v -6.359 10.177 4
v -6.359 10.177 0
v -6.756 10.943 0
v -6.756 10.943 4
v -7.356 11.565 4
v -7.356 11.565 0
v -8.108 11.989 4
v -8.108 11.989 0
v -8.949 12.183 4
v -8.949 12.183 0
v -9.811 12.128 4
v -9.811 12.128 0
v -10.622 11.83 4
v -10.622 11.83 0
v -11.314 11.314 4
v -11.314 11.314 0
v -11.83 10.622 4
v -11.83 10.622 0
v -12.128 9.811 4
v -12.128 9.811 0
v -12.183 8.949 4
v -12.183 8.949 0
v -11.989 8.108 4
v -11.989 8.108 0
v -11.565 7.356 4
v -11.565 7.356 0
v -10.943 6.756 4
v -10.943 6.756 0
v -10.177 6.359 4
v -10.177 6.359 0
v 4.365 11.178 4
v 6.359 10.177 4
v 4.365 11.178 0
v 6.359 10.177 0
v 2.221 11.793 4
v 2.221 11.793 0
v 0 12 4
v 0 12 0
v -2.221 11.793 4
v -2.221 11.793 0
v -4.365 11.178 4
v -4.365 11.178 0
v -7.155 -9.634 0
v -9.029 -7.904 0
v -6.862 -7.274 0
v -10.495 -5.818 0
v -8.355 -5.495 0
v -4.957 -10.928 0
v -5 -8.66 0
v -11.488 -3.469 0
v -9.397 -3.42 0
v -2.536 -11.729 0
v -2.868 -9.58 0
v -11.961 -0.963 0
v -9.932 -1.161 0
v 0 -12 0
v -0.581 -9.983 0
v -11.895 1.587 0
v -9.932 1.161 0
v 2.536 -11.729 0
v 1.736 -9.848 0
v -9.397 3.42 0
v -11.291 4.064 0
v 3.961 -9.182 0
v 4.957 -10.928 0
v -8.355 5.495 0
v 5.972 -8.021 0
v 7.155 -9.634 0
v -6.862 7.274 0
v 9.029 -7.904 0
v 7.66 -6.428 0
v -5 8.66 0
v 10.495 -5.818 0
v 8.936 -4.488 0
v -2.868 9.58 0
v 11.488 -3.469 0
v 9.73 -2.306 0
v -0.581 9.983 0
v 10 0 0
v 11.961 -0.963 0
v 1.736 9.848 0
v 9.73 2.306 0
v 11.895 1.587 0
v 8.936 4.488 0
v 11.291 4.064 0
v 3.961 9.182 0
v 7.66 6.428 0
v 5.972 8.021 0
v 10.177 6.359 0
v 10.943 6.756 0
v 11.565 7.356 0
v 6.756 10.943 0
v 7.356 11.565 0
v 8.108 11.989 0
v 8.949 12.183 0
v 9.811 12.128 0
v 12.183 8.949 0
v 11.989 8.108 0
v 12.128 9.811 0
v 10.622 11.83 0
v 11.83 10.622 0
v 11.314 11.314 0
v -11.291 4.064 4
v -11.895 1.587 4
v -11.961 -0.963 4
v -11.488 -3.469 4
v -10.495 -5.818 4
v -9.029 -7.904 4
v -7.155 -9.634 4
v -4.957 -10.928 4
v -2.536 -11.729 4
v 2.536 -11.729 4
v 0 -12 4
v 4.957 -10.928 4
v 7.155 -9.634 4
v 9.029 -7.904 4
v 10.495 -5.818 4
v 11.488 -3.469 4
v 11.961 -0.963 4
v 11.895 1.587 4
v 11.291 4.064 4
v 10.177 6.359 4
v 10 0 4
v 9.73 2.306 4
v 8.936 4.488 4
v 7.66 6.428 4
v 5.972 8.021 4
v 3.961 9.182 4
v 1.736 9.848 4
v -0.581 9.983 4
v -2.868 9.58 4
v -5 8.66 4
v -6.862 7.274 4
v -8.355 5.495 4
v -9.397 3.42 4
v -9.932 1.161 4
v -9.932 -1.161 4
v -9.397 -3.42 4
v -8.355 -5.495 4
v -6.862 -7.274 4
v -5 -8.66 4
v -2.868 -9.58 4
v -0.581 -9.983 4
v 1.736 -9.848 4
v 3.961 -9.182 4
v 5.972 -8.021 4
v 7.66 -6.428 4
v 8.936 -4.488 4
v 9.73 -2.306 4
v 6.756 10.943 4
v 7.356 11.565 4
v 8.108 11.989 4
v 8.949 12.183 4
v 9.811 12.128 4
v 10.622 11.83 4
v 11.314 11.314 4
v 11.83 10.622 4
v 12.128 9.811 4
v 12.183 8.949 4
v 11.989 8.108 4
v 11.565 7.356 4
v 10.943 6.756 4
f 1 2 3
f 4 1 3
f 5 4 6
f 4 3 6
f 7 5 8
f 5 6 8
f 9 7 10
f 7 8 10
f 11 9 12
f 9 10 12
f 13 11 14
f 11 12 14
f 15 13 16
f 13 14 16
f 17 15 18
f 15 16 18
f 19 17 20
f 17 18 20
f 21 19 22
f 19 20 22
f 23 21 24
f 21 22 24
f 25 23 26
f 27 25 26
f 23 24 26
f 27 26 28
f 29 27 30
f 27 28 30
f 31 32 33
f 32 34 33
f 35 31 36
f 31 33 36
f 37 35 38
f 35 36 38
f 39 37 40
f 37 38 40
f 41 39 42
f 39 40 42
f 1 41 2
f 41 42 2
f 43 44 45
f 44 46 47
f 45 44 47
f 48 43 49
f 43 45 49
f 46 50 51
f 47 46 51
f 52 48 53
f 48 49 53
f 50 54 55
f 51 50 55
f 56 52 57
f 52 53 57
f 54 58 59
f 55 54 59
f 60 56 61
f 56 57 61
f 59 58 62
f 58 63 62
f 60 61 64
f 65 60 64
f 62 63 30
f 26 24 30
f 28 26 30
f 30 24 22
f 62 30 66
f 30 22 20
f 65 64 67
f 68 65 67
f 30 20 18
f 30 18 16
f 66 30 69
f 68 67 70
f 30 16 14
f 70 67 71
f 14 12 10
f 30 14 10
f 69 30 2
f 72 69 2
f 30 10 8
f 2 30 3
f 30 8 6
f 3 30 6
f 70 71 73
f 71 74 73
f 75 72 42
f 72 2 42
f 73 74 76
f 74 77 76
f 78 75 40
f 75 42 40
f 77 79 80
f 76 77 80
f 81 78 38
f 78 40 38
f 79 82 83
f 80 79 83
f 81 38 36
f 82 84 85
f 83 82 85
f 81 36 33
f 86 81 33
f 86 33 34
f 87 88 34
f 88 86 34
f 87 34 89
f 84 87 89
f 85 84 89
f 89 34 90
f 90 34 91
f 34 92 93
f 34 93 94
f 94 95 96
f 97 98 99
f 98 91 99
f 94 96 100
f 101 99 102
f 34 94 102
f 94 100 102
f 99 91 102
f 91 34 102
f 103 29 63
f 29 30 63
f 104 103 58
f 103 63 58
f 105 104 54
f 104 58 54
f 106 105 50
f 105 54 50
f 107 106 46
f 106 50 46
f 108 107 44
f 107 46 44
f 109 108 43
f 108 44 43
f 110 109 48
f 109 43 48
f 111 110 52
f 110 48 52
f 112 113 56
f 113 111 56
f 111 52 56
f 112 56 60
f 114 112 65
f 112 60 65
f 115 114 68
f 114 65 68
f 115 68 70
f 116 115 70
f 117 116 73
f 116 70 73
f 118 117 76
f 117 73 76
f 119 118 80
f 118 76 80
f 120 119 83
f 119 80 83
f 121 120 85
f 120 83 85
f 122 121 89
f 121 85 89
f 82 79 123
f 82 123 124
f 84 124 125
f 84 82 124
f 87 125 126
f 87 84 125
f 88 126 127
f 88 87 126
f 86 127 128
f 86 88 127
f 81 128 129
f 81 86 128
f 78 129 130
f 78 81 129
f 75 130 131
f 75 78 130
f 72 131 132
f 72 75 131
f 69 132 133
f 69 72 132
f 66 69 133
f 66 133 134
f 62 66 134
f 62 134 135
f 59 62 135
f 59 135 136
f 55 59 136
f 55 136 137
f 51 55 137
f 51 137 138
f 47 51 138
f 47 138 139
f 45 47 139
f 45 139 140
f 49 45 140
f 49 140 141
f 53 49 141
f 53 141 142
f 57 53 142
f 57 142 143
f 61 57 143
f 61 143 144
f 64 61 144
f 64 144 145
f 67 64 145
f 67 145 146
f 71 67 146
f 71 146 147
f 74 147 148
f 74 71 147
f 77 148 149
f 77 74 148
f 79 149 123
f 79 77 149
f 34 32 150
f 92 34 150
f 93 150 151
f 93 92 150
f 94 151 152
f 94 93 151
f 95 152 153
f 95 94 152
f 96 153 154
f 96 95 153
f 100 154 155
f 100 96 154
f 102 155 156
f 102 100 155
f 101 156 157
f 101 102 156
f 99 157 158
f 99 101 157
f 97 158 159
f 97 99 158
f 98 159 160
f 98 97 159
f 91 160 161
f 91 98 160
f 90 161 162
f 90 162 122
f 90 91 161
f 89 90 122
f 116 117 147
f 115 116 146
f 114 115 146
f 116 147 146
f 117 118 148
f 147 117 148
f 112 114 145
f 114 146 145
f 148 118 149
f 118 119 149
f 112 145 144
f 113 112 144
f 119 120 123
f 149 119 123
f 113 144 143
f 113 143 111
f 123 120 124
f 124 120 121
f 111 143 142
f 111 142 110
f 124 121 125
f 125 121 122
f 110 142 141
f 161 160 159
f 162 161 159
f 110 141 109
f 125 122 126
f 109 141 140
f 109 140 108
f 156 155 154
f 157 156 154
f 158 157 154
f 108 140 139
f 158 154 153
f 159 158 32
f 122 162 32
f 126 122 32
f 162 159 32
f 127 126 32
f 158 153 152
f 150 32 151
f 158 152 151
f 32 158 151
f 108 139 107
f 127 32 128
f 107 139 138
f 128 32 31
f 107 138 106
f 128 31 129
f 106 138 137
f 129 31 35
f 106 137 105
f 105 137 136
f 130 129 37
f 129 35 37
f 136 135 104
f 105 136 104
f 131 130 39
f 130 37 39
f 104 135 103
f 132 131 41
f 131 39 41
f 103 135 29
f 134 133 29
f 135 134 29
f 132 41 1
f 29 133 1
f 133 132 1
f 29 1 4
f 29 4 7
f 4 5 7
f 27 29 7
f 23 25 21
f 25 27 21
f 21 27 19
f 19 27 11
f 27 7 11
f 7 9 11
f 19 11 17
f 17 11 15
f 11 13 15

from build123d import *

# Parameters (mm, degrees)
SKETCH_R     = 12
SKETCH_R_2   = 10
PAD_DEPTH    = 4
SKETCH001_R  = 3
PAD001_DEPTH = 4


with BuildPart() as part:
    # Sketch → Pad (new body)
    with BuildSketch(Plane.XY):
        Circle(SKETCH_R)
        Circle(SKETCH_R_2, mode=Mode.SUBTRACT)
    extrude(amount=PAD_DEPTH)

    # Sketch001 → Pad001 (join)
    with BuildSketch(Plane.XY):
        with Locations((-9.192388, 9.192388)):
            Circle(SKETCH001_R)
    pad001 = extrude(amount=PAD001_DEPTH)

    # Mirrored: Pad001 across YZ
    add(pad001.mirror(Plane.YZ))


solid = part.part
